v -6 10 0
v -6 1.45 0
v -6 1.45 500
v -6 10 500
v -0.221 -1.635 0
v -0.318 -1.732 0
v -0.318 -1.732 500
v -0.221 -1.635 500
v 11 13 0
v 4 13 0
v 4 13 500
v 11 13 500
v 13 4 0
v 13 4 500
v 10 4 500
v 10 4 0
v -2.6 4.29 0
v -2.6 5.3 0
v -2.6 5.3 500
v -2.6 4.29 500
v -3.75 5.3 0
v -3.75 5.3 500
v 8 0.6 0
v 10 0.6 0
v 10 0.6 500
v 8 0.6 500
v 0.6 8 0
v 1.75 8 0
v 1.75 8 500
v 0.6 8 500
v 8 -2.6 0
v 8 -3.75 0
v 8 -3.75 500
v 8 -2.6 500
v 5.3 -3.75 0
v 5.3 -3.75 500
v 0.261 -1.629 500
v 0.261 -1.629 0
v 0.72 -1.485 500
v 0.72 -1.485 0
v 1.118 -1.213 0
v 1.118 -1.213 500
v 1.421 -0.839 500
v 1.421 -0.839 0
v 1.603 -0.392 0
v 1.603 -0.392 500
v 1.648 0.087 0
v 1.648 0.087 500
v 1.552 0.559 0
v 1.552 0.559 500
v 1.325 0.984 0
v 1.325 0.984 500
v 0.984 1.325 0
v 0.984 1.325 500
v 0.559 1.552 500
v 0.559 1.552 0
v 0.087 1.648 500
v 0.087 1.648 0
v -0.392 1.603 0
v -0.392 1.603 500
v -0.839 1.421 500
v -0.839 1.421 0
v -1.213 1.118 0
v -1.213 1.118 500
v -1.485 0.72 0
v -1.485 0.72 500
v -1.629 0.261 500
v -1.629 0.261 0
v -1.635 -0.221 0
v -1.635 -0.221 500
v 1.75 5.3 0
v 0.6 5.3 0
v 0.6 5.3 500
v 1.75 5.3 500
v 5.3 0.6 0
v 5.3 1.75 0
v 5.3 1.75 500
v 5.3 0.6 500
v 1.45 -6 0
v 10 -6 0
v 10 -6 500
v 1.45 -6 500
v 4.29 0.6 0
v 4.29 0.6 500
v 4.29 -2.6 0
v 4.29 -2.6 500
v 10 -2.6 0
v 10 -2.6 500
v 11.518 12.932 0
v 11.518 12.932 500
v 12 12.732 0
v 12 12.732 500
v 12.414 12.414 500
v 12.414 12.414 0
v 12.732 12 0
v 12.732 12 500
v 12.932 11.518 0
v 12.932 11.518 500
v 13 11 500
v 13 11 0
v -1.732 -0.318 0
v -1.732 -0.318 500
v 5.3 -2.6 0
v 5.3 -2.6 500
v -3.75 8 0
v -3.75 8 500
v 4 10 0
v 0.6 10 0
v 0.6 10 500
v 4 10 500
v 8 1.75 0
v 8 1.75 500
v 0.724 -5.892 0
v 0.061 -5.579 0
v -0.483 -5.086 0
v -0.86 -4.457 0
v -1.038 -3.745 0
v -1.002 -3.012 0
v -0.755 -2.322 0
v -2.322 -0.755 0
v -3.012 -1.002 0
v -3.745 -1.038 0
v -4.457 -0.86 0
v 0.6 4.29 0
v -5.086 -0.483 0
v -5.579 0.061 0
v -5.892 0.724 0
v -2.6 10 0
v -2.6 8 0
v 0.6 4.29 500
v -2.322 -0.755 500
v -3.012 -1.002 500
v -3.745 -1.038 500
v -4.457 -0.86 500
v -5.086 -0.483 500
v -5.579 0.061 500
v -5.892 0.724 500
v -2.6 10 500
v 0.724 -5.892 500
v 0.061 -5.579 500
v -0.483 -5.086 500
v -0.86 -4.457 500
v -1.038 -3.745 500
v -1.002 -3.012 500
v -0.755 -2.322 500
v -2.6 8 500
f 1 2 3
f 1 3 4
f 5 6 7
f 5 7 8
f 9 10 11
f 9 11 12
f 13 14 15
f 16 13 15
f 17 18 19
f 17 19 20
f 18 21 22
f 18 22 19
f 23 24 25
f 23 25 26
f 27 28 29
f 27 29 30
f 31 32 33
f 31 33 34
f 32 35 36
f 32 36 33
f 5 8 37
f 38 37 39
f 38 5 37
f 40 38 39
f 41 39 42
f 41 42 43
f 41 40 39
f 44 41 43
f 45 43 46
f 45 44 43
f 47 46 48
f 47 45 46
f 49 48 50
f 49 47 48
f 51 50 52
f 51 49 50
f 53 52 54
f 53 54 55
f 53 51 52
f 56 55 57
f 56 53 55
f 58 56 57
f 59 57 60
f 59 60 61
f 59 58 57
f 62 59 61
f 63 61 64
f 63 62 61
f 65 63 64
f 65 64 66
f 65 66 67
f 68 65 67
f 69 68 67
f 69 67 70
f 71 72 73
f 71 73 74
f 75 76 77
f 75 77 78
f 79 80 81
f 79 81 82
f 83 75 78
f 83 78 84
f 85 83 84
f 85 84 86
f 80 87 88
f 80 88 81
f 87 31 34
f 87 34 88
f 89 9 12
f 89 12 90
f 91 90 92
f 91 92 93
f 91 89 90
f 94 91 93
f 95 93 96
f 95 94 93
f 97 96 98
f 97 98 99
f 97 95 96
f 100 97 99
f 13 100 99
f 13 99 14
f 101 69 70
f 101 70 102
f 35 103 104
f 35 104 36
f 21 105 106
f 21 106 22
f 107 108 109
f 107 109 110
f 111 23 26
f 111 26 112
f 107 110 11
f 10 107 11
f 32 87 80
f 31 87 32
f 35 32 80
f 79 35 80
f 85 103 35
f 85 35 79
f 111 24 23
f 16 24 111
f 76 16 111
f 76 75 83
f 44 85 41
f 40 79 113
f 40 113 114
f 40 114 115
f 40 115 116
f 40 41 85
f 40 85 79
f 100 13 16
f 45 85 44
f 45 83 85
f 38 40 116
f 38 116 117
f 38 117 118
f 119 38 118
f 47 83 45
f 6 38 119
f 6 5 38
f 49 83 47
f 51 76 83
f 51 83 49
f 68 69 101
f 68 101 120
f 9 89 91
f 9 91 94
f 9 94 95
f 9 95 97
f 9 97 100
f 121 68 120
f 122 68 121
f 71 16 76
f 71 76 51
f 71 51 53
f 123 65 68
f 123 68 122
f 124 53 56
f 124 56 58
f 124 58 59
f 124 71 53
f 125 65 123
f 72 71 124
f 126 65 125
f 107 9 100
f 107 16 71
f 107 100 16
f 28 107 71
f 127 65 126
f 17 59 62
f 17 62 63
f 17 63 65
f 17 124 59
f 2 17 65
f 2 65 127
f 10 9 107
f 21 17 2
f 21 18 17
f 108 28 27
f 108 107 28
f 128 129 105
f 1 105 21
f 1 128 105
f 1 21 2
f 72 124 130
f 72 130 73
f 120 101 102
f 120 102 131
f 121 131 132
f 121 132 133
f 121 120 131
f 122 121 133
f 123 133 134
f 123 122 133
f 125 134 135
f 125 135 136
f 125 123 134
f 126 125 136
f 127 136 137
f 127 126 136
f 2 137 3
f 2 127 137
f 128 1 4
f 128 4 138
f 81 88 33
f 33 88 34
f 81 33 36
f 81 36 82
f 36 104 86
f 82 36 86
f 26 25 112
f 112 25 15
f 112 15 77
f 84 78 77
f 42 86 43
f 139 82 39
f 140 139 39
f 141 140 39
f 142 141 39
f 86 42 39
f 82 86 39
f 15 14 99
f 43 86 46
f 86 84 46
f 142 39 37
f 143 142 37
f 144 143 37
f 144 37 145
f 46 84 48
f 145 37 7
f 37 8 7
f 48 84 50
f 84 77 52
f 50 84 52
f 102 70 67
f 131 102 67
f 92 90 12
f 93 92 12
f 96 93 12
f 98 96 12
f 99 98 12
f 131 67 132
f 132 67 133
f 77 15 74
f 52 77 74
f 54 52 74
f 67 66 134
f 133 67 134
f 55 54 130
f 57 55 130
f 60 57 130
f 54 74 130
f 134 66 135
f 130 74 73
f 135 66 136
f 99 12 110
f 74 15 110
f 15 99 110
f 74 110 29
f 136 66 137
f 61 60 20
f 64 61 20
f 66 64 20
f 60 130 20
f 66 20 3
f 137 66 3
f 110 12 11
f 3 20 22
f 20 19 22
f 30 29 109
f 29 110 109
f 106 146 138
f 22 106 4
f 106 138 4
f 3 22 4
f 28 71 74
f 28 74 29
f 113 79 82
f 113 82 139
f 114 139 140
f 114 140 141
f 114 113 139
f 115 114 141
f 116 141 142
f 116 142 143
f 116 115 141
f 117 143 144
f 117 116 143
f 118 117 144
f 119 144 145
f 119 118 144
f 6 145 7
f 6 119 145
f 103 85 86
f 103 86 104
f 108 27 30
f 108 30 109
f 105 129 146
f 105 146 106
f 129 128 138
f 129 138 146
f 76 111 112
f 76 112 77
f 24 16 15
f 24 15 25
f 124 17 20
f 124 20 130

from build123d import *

# Parameters (mm, degrees)
EXTRUDE_1_DEPTH = 500


with BuildPart() as part:
    # Model → 凸台-拉伸1 (new body)
    with BuildSketch(Plane.XY):
        with BuildLine():
            Line((-6, 1.449747468), (-6, 10))
            Line((-6, 10), (-2.6, 10))
            Line((-2.6, 10), (-2.6, 8))
            Line((-2.6, 8), (-3.75, 8))
            Line((-3.75, 8), (-3.75, 5.3))
            Line((-3.75, 5.3), (-2.6, 5.3))
            Line((-2.6, 5.3), (-2.6, 4.29034466))
            Line((-2.6, 4.29034466), (0.6, 4.29034466))
            Line((0.6, 4.29034466), (0.6, 5.3))
            Line((0.6, 5.3), (1.75, 5.3))
            Line((1.75, 5.3), (1.75, 8))
            Line((1.75, 8), (0.6, 8))
            Line((0.6, 8), (0.6, 10))
            Line((0.6, 10), (4, 10))
            Line((4, 10), (4, 13))
            Line((4, 13), (11, 13))
            ThreePointArc((11, 13), (12.414213562, 12.414213562), (13, 11))
            Line((13, 11), (13, 4))
            Line((13, 4), (10, 4))
            Line((10, 4), (10, 0.6))
            Line((10, 0.6), (8, 0.6))
            Line((8, 0.6), (8, 1.75))
            Line((8, 1.75), (5.3, 1.75))
            Line((5.3, 1.75), (5.3, 0.6))
            Line((5.3, 0.6), (4.29034466, 0.6))
            Line((4.29034466, 0.6), (4.29034466, -2.6))
            Line((4.29034466, -2.6), (5.3, -2.6))
            Line((5.3, -2.6), (5.3, -3.75))
            Line((5.3, -3.75), (8, -3.75))
            Line((8, -3.75), (8, -2.6))
            Line((8, -2.6), (10, -2.6))
            Line((10, -2.6), (10, -6))
            Line((10, -6), (1.449747468, -6))
            ThreePointArc((1.449747468, -6), (-0.859951363, -4.456708581), (-0.318019485, -1.732233047))
            Line((-0.318019485, -1.732233047), (-0.220928778, -1.635142341))
            ThreePointArc((-0.220928778, -1.635142341), (1.166726189, 1.166726189), (-1.635142341, -0.220928778))
            Line((-1.635142341, -0.220928778), (-1.732233047, -0.318019485))
            ThreePointArc((-1.732233047, -0.318019485), (-4.456708581, -0.859951363), (-6, 1.449747468))
        make_face()
    extrude(amount=EXTRUDE_1_DEPTH)


solid = part.part
